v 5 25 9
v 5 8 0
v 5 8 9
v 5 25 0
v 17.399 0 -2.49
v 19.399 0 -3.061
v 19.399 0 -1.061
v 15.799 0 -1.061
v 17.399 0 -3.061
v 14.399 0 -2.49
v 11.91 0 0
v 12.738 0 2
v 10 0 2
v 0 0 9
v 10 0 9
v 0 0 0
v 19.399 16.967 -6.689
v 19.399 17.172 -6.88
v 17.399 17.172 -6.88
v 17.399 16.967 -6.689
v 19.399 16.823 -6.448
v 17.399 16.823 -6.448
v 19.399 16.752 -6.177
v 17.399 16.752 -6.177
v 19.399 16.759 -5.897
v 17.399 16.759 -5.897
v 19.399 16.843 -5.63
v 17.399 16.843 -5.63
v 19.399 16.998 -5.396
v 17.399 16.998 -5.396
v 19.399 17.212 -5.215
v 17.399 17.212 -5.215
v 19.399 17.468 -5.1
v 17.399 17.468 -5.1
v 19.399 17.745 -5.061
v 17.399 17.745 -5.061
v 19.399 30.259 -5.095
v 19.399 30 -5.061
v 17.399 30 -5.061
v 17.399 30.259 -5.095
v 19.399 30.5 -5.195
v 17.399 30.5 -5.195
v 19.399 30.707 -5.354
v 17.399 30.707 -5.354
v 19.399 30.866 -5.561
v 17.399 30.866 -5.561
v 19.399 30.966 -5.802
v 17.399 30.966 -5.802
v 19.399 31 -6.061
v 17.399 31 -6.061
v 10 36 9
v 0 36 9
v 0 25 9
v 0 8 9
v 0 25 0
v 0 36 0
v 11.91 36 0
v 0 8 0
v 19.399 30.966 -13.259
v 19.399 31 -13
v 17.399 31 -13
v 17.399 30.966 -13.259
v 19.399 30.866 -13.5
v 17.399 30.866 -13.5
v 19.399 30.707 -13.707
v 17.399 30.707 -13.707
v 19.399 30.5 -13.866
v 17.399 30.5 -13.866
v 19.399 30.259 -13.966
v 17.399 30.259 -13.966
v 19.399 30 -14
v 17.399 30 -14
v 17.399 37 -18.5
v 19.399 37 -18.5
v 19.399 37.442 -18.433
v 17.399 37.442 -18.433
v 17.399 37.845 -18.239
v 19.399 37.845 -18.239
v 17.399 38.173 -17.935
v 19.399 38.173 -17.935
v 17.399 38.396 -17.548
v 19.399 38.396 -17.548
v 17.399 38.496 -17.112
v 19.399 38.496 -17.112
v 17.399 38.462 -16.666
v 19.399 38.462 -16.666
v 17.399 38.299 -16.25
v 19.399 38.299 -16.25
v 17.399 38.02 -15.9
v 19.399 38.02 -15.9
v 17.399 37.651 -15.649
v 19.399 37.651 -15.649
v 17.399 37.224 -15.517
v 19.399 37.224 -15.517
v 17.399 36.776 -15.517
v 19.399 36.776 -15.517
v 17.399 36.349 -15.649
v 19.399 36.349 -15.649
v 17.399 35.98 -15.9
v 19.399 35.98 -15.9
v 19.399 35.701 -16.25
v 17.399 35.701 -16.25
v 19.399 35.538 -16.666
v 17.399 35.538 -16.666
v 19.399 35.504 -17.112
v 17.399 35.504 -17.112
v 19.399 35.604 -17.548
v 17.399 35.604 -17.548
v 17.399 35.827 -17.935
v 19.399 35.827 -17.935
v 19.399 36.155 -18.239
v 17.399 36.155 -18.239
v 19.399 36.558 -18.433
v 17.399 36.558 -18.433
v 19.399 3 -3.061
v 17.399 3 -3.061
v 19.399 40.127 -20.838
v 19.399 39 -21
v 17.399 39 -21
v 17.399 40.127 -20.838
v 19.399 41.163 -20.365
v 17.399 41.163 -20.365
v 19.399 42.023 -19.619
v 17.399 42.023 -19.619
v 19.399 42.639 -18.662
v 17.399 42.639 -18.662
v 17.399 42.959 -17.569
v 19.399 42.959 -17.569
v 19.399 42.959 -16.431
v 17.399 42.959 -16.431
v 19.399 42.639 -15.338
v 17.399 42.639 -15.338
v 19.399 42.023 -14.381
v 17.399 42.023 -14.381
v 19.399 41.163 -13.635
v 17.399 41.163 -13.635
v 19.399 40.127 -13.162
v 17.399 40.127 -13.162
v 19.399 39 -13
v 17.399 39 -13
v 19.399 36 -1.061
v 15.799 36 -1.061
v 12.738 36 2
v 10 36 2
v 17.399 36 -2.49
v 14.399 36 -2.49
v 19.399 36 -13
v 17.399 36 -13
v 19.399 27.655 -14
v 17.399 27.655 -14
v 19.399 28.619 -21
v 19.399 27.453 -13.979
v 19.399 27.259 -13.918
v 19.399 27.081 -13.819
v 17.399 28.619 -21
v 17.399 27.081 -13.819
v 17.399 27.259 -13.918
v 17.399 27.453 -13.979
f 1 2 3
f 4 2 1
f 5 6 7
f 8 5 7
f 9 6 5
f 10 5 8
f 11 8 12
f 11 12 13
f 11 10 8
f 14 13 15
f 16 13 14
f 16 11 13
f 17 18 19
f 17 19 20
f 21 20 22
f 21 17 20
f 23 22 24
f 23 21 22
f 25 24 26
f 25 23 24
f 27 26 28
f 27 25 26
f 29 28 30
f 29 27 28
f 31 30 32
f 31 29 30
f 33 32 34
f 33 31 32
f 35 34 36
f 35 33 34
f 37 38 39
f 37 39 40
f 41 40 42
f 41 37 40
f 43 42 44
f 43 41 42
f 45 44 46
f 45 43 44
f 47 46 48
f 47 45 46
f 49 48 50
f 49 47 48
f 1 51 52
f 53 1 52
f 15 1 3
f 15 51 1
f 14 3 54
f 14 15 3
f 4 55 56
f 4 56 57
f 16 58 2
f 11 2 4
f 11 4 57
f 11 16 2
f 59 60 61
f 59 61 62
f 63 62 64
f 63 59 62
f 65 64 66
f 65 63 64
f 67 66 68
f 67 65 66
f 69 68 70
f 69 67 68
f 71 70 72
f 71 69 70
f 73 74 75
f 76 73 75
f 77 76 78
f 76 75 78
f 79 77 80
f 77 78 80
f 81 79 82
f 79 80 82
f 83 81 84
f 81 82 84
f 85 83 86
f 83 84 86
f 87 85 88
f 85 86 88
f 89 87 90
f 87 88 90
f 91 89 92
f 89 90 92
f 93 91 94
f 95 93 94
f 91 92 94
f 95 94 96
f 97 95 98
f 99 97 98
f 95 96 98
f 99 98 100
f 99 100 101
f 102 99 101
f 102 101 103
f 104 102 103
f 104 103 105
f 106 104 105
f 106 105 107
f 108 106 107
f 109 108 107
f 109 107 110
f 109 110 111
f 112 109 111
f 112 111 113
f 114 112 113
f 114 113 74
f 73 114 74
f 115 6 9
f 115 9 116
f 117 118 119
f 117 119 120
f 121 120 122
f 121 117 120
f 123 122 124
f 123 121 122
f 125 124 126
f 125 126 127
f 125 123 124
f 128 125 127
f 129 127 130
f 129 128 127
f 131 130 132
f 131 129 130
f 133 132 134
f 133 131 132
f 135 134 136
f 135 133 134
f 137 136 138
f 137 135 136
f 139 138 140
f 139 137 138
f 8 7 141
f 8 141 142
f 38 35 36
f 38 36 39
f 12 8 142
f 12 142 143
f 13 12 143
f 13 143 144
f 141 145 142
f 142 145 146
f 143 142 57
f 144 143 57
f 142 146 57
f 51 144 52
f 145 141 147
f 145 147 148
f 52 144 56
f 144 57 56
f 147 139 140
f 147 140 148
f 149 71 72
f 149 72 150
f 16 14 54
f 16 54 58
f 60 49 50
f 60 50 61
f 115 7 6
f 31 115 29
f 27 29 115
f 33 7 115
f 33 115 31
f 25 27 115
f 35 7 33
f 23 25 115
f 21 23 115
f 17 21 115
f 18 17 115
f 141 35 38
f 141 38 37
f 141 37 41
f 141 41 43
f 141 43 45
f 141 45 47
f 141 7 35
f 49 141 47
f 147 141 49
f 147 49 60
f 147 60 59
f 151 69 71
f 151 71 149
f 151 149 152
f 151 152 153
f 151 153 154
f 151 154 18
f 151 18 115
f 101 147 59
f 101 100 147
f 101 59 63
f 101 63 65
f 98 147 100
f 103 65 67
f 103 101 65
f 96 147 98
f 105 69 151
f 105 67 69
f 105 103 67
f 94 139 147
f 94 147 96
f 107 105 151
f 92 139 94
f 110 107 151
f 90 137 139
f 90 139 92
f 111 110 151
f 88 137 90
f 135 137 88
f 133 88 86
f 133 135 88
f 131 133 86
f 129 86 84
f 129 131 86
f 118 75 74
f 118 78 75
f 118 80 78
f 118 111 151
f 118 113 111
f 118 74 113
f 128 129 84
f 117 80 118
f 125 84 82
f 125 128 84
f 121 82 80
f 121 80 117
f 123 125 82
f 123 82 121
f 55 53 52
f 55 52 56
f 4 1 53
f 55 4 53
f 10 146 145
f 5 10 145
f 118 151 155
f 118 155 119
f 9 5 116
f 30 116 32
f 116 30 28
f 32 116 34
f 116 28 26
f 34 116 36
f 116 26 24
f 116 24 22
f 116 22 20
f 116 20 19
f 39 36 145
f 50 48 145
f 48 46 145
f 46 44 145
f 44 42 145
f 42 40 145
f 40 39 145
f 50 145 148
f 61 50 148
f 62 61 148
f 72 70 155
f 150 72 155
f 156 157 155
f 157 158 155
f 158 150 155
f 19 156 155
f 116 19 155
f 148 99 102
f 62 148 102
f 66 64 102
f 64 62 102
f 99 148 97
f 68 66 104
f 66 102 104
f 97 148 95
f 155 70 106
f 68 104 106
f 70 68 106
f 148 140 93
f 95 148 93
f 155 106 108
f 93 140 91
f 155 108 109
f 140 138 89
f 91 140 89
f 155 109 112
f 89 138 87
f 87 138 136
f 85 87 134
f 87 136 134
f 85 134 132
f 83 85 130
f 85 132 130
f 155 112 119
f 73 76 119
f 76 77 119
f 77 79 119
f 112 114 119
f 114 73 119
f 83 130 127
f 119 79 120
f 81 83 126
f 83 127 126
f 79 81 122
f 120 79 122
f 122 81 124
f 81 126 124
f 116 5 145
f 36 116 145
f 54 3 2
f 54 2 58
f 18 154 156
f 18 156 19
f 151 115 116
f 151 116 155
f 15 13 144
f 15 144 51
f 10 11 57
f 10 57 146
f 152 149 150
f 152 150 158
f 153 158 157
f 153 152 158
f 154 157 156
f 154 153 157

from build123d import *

# Parameters (mm, degrees)
BOSS_EXTRUDE1_DEPTH = 36
CUT_EXTRUDE1_REACH  = 21.399
CUT_EXTRUDE2_REACH  = 21.399
BOSS_EXTRUDE2_DEPTH = 2
CUT_EXTRUDE3_REACH  = 21.399
SKETCH5_R           = 1.5
CUT_EXTRUDE4_REACH  = 11
SKETCH6_W           = 5
SKETCH6_H           = 17


with BuildPart() as part:
    # Sketch1 → Boss-Extrude1 (new body)
    with BuildSketch(Plane(origin=(0, 0, 0), x_dir=(1, 0, 0), z_dir=(0, 1, 0))):
        Polygon((0, 0), (11.909668113, 0), (14.399319728, 2.489651615), (17.399319728, 2.489651615), (17.399319728, 21), (19.399319728, 21), (19.399319728, 1.06122449), (15.799319728, 1.06122449), (12.738095238, -2), (10, -2), (10, -9), (0, -9), align=None)
    extrude(amount=BOSS_EXTRUDE1_DEPTH)

    # Sketch2 → Cut-Extrude1 (cut, up to next)
    with BuildSketch(Plane(origin=(19.399319728, 0, 0), x_dir=(0, 0, -1), z_dir=(1, 0, 0)), mode=Mode.PRIVATE) as cut_extrude1_sk1:
        Polygon((3.06122449, 0), (3.06122449, 3), (21, 28.619226488), (21, 0), align=None)
    cut_extrude1_tool1 = extrude(cut_extrude1_sk1.sketch, amount=-CUT_EXTRUDE1_REACH, mode=Mode.PRIVATE) & part.part
    add(cut_extrude1_tool1.solids().sort_by_distance((19.39932, 9.634621, -14.453071))[0], mode=Mode.SUBTRACT)

    # Sketch3 → Cut-Extrude2 (cut, up to next)
    with BuildSketch(Plane(origin=(19.399319728, 0, 0), x_dir=(0, 0, -1), z_dir=(1, 0, 0)), mode=Mode.PRIVATE) as cut_extrude2_sk1:
        with BuildLine():
            Line((5.06122449, 17.745124794), (5.06122449, 30))
            ThreePointArc((5.06122449, 30), (5.354117709, 30.707106781), (6.06122449, 31))
            Line((6.06122449, 31), (13, 31))
            ThreePointArc((13, 31), (13.707106781, 30.707106781), (14, 30))
            Line((14, 30), (14, 27.654723208))
            ThreePointArc((14, 27.654723208), (13.953716951, 27.354017409), (13.819152044, 27.081146772))
            Line((13.819152044, 27.081146772), (6.880376534, 17.171548358))
            ThreePointArc((6.880376534, 17.171548358), (5.76051869, 16.791407843), (5.06122449, 17.745124794))
        make_face()
    cut_extrude2_tool1 = extrude(cut_extrude2_sk1.sketch, amount=-CUT_EXTRUDE2_REACH, mode=Mode.PRIVATE) & part.part
    add(cut_extrude2_tool1.solids().sort_by_distance((19.39932, 25.474687, -8.644546))[0], mode=Mode.SUBTRACT)

    # Sketch4 → Boss-Extrude2 (add)
    with BuildSketch(Plane(origin=(19.399319728, 0, 0), x_dir=(0, 0, -1), z_dir=(1, 0, 0))):
        with BuildLine():
            Line((21, 36), (21, 39))
            ThreePointArc((21, 39), (17, 43), (13, 39))
            Line((13, 39), (13, 36))
            Line((13, 36), (21, 36))
        make_face()
    extrude(amount=-BOSS_EXTRUDE2_DEPTH)

    # Sketch5 → Cut-Extrude3 (cut, up to next)
    with BuildSketch(Plane(origin=(19.399319728, 0, 0), x_dir=(0, 0, -1), z_dir=(1, 0, 0)), mode=Mode.PRIVATE) as cut_extrude3_sk1:
        with Locations((17, 37)):
            Circle(SKETCH5_R)
    cut_extrude3_tool1 = extrude(cut_extrude3_sk1.sketch, amount=-CUT_EXTRUDE3_REACH, mode=Mode.PRIVATE) & part.part
    add(cut_extrude3_tool1.solids().sort_by_distance((19.39932, 37, -17))[0], mode=Mode.SUBTRACT)

    # Sketch6 → Cut-Extrude4 (cut, up to next)
    with BuildSketch(Plane(origin=(0, 0, 0), x_dir=(-1, 0, 0), z_dir=(0, 0, -1)), mode=Mode.PRIVATE) as cut_extrude4_sk1:
        with Locations((-2.5, 16.5)):
            Rectangle(SKETCH6_W, SKETCH6_H)
    cut_extrude4_tool1 = extrude(cut_extrude4_sk1.sketch, amount=-CUT_EXTRUDE4_REACH, mode=Mode.PRIVATE) & part.part
    add(cut_extrude4_tool1.solids().sort_by_distance((2.5, 16.5, 0))[0], mode=Mode.SUBTRACT)


solid = part.part
